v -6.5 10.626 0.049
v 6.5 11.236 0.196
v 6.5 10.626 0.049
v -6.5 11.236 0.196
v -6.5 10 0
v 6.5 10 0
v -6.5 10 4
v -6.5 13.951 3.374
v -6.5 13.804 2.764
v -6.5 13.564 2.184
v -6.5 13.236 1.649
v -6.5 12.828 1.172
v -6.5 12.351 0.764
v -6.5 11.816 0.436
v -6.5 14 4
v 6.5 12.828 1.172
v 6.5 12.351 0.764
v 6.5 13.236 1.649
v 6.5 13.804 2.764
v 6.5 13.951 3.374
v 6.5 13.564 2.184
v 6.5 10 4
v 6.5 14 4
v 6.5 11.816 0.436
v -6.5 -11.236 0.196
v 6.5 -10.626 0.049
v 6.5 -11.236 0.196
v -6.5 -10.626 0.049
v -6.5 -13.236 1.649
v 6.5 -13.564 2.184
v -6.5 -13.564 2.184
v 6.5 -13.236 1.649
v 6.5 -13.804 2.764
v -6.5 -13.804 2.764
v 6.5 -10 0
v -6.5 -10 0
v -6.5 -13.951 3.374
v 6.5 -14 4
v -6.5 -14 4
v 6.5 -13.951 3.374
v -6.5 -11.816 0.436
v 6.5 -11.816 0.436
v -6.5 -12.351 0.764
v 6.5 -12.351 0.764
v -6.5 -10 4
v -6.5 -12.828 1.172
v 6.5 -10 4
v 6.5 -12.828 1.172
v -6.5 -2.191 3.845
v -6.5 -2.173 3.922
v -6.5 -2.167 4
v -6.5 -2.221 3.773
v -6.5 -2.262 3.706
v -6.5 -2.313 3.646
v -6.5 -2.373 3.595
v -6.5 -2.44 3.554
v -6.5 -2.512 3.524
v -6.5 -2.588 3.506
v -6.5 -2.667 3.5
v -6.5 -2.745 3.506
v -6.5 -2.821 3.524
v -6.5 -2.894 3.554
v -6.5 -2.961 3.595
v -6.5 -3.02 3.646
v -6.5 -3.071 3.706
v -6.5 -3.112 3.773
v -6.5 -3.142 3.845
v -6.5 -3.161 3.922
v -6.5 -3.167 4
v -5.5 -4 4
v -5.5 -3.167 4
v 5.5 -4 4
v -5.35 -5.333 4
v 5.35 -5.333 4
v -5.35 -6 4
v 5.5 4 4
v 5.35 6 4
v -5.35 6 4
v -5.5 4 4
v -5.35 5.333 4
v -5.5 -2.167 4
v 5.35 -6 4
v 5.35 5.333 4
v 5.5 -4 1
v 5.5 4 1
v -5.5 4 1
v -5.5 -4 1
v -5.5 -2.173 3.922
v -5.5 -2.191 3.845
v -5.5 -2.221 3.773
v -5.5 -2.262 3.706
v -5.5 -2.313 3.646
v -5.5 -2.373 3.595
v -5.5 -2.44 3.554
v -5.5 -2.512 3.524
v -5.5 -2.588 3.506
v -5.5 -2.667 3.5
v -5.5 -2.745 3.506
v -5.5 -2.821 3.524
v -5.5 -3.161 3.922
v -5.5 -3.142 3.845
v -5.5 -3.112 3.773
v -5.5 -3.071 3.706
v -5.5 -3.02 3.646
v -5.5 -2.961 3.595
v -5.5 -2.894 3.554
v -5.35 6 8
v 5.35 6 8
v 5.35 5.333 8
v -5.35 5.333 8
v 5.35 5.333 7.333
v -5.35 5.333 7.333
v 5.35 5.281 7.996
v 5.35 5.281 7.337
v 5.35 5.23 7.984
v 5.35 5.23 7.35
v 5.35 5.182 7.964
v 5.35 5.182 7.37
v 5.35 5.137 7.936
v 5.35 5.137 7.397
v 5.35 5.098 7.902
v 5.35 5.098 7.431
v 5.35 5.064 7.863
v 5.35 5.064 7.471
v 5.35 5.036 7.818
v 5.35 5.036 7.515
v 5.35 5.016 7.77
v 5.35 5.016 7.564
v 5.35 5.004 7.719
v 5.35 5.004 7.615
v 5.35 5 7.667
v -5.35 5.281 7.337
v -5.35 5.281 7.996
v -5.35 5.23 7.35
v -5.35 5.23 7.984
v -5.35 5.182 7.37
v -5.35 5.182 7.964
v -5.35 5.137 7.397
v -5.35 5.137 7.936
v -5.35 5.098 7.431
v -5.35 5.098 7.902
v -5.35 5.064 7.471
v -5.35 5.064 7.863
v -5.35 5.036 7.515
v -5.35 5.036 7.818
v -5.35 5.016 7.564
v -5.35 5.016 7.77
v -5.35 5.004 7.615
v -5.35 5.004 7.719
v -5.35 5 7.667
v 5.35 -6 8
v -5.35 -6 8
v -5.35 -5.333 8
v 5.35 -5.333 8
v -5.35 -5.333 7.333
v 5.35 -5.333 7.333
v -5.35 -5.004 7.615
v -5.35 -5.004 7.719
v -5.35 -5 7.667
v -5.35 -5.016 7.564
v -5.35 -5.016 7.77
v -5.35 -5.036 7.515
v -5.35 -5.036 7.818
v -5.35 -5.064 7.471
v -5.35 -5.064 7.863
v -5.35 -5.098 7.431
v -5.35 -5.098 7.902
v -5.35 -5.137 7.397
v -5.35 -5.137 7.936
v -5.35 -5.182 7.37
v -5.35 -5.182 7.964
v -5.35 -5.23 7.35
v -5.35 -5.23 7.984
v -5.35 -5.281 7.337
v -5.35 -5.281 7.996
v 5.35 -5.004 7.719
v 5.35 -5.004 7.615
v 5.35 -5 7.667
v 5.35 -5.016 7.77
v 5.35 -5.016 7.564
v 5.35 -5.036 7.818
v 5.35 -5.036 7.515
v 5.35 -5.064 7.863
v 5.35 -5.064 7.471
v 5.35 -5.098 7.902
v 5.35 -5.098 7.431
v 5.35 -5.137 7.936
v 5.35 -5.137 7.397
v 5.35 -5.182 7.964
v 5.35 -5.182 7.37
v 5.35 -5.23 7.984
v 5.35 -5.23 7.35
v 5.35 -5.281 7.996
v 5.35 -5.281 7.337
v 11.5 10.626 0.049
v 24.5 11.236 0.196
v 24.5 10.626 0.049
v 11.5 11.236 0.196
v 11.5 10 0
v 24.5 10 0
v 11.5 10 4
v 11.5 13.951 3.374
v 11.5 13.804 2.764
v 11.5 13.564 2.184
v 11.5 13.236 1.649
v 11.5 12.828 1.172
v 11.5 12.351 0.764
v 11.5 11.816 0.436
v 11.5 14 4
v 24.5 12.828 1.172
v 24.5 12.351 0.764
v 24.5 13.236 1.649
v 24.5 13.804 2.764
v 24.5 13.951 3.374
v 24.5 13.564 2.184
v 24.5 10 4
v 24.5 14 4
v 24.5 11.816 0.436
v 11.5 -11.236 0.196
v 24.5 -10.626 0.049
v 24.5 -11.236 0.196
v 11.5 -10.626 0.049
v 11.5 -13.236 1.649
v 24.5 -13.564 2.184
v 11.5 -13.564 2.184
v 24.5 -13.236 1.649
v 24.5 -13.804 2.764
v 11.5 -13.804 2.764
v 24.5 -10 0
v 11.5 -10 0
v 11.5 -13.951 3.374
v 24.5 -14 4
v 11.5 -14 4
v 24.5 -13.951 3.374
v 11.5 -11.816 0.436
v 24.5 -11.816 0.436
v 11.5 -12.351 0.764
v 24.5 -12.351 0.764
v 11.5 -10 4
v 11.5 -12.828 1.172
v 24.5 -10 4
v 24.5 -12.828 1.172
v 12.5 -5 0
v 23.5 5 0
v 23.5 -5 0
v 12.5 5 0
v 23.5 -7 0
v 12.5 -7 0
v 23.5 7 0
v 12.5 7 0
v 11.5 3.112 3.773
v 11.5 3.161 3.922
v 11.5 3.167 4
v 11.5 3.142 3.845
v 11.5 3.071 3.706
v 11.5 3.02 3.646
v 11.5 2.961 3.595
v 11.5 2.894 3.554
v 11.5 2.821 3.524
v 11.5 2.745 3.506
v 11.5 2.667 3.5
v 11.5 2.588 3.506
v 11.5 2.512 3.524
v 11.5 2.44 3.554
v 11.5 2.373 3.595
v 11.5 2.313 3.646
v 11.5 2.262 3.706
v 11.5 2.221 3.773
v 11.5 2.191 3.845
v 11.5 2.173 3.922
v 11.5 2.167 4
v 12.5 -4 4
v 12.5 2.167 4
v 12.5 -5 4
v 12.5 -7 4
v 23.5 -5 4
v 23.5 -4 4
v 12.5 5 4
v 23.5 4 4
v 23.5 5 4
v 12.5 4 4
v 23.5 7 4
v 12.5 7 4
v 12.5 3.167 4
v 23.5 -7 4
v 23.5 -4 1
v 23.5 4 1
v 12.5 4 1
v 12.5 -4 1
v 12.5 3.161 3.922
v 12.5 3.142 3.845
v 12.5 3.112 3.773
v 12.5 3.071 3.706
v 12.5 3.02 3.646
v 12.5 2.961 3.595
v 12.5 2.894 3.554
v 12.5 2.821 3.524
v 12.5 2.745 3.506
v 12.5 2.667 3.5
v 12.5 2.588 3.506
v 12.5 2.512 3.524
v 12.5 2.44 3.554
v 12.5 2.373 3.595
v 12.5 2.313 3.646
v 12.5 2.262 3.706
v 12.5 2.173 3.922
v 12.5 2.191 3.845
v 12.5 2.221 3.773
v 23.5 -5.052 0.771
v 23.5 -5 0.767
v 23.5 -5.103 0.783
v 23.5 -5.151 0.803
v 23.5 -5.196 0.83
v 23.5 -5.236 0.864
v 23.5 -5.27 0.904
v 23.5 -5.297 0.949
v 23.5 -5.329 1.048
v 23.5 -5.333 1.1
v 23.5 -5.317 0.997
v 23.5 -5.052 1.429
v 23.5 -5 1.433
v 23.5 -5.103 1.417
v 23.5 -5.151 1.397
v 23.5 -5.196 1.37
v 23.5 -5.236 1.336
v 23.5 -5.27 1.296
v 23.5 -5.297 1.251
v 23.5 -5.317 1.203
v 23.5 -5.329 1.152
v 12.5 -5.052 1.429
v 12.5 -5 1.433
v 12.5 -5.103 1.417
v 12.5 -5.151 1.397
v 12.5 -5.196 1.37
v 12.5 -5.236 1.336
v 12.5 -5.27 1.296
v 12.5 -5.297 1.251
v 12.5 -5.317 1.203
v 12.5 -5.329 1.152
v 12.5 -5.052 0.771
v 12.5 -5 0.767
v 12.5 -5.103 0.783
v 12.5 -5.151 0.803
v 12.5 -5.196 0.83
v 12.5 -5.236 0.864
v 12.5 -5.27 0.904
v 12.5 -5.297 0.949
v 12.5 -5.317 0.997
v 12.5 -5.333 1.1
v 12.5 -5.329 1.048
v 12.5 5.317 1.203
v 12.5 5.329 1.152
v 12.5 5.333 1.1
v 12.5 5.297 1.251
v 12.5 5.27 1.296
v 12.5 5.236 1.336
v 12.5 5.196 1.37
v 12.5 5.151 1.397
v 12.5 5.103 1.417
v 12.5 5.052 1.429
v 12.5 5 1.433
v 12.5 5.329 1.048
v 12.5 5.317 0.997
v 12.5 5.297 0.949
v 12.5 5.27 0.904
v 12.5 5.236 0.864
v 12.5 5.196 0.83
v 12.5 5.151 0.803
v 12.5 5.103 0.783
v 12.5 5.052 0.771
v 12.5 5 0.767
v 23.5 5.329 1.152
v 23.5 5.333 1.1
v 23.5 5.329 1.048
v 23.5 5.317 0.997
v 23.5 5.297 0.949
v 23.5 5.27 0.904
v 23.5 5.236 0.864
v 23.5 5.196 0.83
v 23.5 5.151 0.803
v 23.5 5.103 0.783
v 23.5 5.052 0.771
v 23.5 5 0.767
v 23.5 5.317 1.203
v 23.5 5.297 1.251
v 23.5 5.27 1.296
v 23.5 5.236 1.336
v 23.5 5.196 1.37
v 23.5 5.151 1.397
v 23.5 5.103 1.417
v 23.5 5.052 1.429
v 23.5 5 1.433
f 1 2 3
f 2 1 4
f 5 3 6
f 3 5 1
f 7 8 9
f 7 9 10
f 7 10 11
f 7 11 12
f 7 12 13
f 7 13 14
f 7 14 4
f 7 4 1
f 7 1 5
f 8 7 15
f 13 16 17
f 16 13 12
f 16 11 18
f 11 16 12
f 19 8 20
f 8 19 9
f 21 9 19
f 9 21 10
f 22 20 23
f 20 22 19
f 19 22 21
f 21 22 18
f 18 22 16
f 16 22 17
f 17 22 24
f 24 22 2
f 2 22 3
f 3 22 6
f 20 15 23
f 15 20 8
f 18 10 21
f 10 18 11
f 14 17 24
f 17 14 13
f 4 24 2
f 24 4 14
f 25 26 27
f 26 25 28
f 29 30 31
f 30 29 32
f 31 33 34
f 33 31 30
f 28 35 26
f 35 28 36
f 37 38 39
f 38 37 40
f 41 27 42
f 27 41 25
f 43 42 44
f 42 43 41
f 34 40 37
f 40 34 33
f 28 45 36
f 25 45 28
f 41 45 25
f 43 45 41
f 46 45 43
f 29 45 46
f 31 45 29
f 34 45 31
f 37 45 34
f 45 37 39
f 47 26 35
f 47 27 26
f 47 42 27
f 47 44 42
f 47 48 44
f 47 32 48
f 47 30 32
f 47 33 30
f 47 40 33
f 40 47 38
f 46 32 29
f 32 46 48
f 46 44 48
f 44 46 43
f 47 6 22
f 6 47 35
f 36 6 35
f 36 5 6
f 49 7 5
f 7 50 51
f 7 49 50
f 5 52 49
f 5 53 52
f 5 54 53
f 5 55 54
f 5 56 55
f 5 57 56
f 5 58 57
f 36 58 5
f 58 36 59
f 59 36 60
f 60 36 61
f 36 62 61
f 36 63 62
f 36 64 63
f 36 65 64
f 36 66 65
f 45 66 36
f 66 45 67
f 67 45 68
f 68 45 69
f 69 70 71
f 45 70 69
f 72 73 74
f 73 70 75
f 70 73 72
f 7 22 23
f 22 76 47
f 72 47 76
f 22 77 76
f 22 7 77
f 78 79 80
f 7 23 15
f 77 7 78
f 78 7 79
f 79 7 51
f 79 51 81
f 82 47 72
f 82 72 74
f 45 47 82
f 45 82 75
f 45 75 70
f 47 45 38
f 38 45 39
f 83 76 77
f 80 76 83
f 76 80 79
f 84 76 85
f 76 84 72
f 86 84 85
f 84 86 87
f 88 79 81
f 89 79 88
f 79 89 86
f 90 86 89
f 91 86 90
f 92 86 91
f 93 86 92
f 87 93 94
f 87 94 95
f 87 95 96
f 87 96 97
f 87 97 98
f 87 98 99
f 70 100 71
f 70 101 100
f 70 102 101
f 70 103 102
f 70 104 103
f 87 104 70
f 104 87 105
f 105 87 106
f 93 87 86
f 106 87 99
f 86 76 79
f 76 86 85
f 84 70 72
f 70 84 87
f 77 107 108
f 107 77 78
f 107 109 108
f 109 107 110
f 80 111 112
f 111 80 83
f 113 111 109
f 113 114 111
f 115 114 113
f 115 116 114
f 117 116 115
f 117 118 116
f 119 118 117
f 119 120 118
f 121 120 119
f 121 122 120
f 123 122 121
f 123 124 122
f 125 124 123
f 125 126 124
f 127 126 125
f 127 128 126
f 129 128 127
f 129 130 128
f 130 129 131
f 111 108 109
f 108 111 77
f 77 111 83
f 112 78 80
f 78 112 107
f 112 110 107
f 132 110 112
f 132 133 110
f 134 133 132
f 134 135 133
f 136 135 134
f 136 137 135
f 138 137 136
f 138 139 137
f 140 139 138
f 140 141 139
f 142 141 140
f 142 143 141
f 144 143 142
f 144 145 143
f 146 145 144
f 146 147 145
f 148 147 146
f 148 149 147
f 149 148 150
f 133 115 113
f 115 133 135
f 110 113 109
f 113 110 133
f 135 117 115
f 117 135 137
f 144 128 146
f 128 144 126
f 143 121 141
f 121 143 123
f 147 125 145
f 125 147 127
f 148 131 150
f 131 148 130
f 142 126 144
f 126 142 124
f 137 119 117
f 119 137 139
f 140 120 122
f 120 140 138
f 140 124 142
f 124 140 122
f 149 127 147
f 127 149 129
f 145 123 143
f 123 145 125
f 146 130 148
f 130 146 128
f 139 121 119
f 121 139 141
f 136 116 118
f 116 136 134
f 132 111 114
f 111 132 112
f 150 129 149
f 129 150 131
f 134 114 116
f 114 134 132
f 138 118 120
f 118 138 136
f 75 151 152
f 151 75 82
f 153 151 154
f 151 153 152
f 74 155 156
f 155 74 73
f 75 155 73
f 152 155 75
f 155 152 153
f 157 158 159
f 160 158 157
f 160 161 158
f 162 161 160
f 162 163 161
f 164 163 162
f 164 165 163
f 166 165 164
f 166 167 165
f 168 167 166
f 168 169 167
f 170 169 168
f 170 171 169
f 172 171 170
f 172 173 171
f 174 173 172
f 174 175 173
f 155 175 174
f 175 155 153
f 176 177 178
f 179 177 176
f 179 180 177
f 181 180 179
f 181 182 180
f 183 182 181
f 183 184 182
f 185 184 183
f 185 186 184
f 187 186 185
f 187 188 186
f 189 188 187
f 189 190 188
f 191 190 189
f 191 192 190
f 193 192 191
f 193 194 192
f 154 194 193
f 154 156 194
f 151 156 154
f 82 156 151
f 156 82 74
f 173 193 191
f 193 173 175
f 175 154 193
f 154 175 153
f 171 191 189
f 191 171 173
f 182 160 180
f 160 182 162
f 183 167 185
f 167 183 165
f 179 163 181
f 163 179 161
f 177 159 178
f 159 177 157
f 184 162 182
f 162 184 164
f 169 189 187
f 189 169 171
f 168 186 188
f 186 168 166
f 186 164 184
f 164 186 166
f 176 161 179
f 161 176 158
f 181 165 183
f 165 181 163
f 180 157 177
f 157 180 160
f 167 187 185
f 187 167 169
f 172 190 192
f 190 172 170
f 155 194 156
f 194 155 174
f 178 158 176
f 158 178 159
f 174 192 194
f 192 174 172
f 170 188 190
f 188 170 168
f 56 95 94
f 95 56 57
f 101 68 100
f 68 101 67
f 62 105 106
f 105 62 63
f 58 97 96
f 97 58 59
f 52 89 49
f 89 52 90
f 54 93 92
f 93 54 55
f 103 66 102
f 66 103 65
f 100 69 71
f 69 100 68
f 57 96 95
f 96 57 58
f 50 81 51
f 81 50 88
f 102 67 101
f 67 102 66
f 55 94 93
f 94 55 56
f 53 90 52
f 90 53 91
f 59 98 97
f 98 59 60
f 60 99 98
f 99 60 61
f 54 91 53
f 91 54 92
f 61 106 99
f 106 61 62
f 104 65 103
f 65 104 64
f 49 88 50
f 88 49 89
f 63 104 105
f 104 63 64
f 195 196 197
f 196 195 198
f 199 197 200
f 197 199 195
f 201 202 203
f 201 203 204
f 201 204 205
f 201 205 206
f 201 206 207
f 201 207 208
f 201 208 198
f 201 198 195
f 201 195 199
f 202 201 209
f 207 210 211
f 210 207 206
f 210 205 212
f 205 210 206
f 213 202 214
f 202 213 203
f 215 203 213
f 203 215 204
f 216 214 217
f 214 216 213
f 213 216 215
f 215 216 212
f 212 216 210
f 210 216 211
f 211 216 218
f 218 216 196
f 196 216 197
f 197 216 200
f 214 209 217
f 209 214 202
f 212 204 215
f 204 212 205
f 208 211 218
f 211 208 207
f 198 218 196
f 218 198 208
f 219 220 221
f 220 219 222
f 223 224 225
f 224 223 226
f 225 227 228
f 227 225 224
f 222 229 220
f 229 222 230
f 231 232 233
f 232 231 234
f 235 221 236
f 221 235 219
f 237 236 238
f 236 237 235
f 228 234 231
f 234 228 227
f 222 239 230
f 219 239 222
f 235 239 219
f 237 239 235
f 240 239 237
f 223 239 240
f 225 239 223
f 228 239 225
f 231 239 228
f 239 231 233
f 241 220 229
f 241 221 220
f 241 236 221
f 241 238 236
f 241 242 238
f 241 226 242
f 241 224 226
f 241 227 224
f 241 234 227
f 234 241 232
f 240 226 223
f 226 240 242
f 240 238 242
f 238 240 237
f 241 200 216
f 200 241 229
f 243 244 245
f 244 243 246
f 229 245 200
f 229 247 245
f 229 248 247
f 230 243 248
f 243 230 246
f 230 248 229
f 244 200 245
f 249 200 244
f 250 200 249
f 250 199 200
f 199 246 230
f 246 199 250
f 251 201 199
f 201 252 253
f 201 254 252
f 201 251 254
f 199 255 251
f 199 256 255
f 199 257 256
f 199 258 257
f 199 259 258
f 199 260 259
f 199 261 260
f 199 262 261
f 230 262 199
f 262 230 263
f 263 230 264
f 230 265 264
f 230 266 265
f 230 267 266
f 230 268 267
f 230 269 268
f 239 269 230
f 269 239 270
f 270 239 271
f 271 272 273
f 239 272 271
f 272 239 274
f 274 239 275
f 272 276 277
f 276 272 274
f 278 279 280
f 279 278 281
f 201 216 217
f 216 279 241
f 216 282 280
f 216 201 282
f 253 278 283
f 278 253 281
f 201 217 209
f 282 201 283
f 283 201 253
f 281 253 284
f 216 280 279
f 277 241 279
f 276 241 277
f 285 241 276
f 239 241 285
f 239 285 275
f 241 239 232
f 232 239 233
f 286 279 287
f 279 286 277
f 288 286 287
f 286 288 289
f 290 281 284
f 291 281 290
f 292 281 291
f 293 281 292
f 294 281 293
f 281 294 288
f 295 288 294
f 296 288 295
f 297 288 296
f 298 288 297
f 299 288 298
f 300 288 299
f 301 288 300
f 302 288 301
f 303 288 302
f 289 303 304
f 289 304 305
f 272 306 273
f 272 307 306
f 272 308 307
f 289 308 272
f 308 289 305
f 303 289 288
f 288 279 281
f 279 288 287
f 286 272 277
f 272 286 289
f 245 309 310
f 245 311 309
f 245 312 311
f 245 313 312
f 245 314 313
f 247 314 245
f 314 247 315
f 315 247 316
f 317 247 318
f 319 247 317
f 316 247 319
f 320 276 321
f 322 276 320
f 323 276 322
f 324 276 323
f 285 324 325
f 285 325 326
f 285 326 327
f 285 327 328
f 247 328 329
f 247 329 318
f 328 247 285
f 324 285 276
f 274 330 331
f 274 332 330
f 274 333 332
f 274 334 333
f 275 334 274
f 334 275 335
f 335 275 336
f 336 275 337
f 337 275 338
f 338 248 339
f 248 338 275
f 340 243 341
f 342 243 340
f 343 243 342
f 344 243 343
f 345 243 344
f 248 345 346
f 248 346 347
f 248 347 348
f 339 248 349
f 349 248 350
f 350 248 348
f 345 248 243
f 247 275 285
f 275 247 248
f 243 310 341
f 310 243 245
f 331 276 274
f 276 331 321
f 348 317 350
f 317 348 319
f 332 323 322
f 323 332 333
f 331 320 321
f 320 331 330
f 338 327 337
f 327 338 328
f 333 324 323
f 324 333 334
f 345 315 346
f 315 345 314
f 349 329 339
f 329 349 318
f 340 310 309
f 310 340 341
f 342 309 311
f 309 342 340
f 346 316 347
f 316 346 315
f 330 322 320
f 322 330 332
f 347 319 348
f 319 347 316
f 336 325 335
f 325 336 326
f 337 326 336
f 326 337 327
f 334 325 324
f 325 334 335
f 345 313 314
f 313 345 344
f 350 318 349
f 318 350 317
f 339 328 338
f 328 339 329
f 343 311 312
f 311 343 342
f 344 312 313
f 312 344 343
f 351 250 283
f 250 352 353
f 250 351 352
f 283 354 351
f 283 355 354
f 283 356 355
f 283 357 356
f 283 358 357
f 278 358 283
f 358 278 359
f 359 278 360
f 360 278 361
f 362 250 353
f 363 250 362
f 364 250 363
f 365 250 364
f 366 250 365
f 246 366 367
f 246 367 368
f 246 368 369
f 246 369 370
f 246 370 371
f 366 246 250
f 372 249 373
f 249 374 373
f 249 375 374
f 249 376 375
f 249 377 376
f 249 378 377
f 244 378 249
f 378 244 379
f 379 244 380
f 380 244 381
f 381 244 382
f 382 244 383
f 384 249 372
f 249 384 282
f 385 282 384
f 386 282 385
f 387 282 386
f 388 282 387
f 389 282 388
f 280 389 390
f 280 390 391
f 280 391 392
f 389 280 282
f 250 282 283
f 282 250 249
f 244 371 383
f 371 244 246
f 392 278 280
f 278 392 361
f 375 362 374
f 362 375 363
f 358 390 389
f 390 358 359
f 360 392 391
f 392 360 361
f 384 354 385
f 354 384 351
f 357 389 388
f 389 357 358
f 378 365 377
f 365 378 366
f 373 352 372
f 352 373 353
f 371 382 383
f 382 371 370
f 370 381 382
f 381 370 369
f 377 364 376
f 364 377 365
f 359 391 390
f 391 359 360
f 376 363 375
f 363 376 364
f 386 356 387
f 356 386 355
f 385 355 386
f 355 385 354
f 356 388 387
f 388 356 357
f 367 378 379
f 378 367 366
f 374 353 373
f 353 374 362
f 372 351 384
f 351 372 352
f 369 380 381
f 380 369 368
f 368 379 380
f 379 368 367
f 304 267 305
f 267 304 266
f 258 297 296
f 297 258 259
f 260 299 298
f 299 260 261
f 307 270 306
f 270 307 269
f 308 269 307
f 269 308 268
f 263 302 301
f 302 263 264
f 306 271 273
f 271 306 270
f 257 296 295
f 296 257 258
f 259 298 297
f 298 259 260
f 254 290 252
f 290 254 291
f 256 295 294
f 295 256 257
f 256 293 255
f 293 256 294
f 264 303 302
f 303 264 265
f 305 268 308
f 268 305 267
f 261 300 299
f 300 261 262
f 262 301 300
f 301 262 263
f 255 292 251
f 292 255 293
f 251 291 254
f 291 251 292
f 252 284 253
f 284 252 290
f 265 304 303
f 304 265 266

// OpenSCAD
//please use the method named test to see if everthing was scaled correctly (for example big motors need stronger clippers)
// to print zoue the compete method
//every number is measured in mm

complete();
//test();


//size of the motor

r_durchmesser = 5; //motor diameter
r_laenge = 10;//length of the motor
r_kasten_breite = 2; // sometimes the motor has a little box on the side for the contacts

Kabel_durchmesser = 1; // diameter of the used cable

// Wall thickness
wand_laenge = 1; //Wall thickness of the legth side minimum 1

wand_breite = 1; //Wall thickness of the broad side minimum 1
wand_hoehe = 1; ////Wall thickness of the top and bottom side minimum 1 

b_ueberlappung = 3; //overlap with fabric (broad side ) + (high/2 is added because of the round edges)
clipper = 2; // size of the clipper hohles directly effects the strength of the clippers minimum 1
//offsets


clipper_offset = 0.3;//if the clippers break because the fitting is too tigth use a higher value

stoff_spielraum = 0.1;// compensates the thickness of the fabric



//use this for more inside space

off_breite = 0.5; //broadside
off_laenge = 0.5; //length side
off_hoehe = 0.5; //hight

//errechnete groeßen
bauteil_breite = r_durchmesser + r_kasten_breite;
clipper_staerke = clipper/3;
//gesamtmaße des Quaders ohne runde Ecken
ges_laenge = r_laenge + 2*wand_laenge + 2*off_laenge;

ges_breite = 2*b_ueberlappung + 2*clipper + 2*wand_breite+bauteil_breite + 2 * off_laenge;

ges_hoehe = 2*wand_hoehe + r_durchmesser+2*off_hoehe;

//maße des inneren quaders
in_breite = bauteil_breite + 2 *off_breite;
in_laenge = r_laenge +2*off_laenge;
in_hoehe = r_durchmesser+2*off_hoehe;


//halbgrößen
h_halb = ges_hoehe/2;
l_halb = ges_laenge/2;
b_halb = ges_breite/2;

h_in_halb = in_hoehe/2;
l_in_halb = in_laenge/2;
b_in_halb = in_breite/2;



module complete()
{

    translate([0,0,h_halb])
    {
        lowerhalf();
    }

    translate([ges_laenge + 5  ,0,h_halb])
    {
        upperhalf();
    }
}

module test()
{
    difference()
    {
        union()
        {
            rotate([0,180,180])
            {
                upperhalf();

            }
            lowerhalf();
            }  
        translate([-l_halb,0,0])
        {
        cube([ges_laenge,ges_breite+ges_hoehe+1,ges_hoehe+1],center=true); 
        }
    }
}
 
module lowerhalf()
{
    difference(){
    union()
    {
        half();
        translate([0,b_in_halb+wand_breite+h_halb/12,0])
        {
            translate([-(in_laenge-clipper_offset)/2,0,h_halb])
            {
                rotate([0,180,-90])
                {
                    union()
                    {
                        cube([clipper_staerke,in_laenge-clipper_offset,h_halb]);
                        translate([0,0,h_halb/12])
                        {
                            rotate([-90,90,0])
                            {  
                                cylinder(h = in_laenge-clipper_offset,d = h_halb/6,$fn=40);
                            }
                        }
                    }
                    
                }
            }
        }
        translate([0,-b_in_halb-wand_breite-h_halb/12,0])
        {
            translate([(in_laenge-clipper_offset)/2,0,h_halb])
            {
                rotate([0,180,90])
                {
                    union()
                    {
                        cube([clipper_staerke,in_laenge-clipper_offset,h_halb]);
                        translate([0,0,h_halb/12])
                        {
                            rotate([-90,90,0])
                            {  
                                cylinder(h = in_laenge-clipper_offset,d = h_halb/6,$fn=40);
                            }
                        }
                    }
                    
                }
            }
        }
    } 
    translate([-l_in_halb-wand_laenge/2,-in_breite/3,0])
        {
            rotate([0,90,0])
            {    
            
                cylinder(h = wand_laenge * 2  ,r = Kabel_durchmesser/2,$fn=40,center=               true);
            
            
            } 
        } 
}}    


module upperhalf()
{
    difference()
    {
        half();
        
        
        translate([-l_in_halb,clipper/2,0])//zentrierung
        {
            translate([0,-clipper/2-b_in_halb-wand_breite,0])//verschiebung
            {   
                rotate([180,0,0])
                {
                    difference()
                    {
                        cube([in_laenge,clipper,h_halb+0.0001]);//flickervermeidung
                        translate([0,0,2*h_halb/3+h_halb/12-stoff_spielraum])
                        {
                            rotate([0,90,0])
                            {  
                                cylinder(h = in_laenge,d = h_halb/6,$fn=40);
                            }
                        }
                    }
                }
            }   
       
        }
        
        
        translate([l_in_halb,-clipper/2,0])//zentrierung
        {
            translate([0,clipper/2+b_in_halb+wand_breite,0])//verschiebung
            {   
                rotate([180,0,180])
                {
                    difference()
                    {
                        cube([in_laenge,clipper,h_halb+0.0001]);//flickervermeidung
                        translate([0,0,2*h_halb/3+h_halb/12-stoff_spielraum])
                        {
                            rotate([0,90,0])
                            {  
                                cylinder(h = in_laenge,d = h_halb/6,$fn=40);
                            }
                        }
                    }
                }
            }   
       
        }
      translate([-l_in_halb-wand_laenge/2,in_breite/3,0])
        {
            rotate([0,90,0])
            {    
            
                cylinder(h = wand_laenge * 2  ,r = Kabel_durchmesser/2,$fn=40,center=               true);
            
            
            } 
        }   
    }   
    
}


module half()
{
    difference()
    {
        body();
        //halbierung
        translate([-l_halb,-b_halb-h_halb,0])
        {
            cube([ges_laenge,ges_breite+2*h_halb,ges_hoehe]);
        }
        //innenraum
        translate([-l_in_halb,-b_in_halb,-h_in_halb])
        {
    
            cube([in_laenge,in_breite,in_hoehe]);
       
        }
        
  
        
    }    
}

module body() 
{
    union()
    {
        cube([ges_laenge,ges_breite,ges_hoehe], center = true);
        rotate([0,90,0])
        {    
            translate([0,b_halb,0])
            {
                cylinder(h = ges_laenge-0.0001,r = h_halb,$fn=40,center=true);
            }
            translate([0,-b_halb,0])
            {
                cylinder(h = ges_laenge-0.0001,r = h_halb,$fn=40,center=true);
            }
            //-0,000001 um artefakte zu verhindern
        }   
    }
}
